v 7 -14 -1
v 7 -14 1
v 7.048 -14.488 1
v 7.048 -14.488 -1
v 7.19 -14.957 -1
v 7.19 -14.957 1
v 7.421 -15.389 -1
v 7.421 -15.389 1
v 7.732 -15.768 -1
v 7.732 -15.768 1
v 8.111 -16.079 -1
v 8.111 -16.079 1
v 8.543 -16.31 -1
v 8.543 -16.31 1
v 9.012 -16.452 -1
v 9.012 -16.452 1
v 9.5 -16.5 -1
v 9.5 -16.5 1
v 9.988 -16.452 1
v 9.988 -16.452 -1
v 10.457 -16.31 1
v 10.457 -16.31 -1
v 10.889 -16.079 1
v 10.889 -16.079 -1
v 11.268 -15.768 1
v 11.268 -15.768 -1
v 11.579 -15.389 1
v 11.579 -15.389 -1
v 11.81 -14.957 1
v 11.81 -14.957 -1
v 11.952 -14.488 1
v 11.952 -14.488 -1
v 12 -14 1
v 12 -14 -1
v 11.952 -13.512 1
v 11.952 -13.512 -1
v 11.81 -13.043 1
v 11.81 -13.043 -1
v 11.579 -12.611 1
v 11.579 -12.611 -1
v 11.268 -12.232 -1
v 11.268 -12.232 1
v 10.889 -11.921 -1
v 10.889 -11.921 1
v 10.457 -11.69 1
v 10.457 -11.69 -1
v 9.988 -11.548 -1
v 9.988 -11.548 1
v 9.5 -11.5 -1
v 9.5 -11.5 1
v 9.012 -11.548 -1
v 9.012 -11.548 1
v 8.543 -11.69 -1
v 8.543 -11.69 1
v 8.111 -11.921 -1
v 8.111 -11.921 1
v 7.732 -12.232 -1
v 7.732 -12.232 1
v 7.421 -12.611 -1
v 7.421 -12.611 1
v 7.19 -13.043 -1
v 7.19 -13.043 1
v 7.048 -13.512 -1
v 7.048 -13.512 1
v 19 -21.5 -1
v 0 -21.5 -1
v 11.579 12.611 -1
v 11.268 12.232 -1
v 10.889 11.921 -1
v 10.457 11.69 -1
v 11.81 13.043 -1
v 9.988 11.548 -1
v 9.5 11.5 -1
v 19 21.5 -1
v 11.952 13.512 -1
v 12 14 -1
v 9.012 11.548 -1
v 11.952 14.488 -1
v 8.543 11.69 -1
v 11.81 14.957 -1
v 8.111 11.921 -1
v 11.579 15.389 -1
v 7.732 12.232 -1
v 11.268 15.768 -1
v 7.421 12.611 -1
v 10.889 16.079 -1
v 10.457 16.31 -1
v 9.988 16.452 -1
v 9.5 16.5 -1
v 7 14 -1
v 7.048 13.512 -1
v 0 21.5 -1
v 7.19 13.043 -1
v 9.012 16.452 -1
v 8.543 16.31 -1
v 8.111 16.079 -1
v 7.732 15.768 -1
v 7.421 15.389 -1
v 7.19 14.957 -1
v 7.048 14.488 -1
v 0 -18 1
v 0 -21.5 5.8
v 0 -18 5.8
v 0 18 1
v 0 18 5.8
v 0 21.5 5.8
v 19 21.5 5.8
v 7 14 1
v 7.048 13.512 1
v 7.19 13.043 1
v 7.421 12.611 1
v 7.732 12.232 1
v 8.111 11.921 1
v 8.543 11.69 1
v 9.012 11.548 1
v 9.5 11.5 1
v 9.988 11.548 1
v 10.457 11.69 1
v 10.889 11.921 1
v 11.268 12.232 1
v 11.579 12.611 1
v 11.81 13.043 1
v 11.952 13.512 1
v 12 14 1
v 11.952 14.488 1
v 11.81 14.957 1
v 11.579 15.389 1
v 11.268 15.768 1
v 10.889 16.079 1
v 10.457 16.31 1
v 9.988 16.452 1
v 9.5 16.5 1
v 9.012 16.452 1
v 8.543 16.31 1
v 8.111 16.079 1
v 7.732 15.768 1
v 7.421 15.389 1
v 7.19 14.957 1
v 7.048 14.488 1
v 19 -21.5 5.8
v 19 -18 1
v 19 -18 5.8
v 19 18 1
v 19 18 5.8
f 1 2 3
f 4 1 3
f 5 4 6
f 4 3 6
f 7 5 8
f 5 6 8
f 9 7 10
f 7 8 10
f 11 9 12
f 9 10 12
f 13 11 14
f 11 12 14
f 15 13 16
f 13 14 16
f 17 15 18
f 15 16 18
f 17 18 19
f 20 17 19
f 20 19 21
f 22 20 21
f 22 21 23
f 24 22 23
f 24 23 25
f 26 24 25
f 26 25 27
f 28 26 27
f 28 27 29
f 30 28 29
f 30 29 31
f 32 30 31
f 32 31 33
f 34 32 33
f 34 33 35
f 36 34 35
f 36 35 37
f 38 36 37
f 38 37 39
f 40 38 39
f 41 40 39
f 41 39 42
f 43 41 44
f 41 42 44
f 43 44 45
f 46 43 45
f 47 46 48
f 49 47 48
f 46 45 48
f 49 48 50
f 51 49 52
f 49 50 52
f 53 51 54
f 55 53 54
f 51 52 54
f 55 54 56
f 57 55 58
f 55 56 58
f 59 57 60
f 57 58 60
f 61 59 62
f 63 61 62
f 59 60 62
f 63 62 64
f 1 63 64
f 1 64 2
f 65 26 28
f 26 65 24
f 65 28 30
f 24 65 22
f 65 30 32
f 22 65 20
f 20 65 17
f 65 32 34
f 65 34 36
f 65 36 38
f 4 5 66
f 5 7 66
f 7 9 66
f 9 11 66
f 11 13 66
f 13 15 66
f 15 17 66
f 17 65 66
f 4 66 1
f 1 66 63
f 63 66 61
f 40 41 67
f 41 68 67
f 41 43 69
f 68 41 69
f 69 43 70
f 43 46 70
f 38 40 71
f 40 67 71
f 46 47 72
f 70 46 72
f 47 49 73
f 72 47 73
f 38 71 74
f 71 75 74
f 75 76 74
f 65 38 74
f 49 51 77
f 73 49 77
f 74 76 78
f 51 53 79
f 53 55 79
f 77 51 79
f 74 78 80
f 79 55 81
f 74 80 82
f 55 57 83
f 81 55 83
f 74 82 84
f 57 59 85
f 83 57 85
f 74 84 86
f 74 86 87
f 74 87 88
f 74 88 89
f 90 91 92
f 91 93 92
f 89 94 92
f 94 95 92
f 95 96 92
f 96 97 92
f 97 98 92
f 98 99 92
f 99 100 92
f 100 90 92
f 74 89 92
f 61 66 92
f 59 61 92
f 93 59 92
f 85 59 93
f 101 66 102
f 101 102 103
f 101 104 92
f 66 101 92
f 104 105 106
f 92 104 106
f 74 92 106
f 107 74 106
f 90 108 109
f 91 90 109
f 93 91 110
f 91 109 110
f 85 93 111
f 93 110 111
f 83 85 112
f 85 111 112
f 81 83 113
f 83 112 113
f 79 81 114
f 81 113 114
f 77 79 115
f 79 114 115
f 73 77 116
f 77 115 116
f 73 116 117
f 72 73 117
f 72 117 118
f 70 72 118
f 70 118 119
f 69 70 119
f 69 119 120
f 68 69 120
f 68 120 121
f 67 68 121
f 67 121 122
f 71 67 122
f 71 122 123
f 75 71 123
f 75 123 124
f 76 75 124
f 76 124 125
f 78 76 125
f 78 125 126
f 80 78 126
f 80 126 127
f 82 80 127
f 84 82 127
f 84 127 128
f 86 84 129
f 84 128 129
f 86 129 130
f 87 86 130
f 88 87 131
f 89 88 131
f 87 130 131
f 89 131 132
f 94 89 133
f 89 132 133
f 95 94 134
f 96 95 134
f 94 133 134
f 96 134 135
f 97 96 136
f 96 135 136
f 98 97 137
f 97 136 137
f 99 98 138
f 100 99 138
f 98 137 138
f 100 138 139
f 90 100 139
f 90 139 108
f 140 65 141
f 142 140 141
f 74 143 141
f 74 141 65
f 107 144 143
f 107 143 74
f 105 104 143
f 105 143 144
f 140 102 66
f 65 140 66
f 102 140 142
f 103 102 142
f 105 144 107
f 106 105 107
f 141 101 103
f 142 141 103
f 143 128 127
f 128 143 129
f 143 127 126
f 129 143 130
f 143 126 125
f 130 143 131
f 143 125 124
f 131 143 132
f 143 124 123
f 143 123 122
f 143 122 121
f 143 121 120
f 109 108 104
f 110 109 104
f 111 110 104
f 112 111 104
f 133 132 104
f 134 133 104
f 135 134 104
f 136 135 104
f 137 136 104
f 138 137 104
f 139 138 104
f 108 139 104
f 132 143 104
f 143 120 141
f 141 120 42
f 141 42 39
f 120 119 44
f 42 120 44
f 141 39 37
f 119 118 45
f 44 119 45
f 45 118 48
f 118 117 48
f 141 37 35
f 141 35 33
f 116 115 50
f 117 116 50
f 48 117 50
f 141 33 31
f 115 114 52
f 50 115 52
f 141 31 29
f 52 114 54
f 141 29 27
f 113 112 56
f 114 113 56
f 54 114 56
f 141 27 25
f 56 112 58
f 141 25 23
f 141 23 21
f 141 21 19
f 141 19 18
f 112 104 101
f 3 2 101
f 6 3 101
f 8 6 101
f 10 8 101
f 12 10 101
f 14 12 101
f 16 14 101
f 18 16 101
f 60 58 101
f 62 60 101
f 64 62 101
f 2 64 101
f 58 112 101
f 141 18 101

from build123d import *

# Parameters (mm, degrees)
F0_W     = 3.5
F0_H     = 4.8
F1_DEPTH = 19
F3_D     = 5
F3_DEPTH = 10
F3_TIP   = 1.5021515476


with BuildPart() as f1:
    # F0 (on Right) → F1 (new body)
    with BuildSketch(Plane.YZ):
        with Locations((-19.75, 3.4)):
            Rectangle(F0_W, F0_H)
        Polygon((21.5, -1), (21.5, 1), (18, 1), (-18, 1), (-21.5, 1), (-21.5, -1), align=None)
        with Locations((19.75, 3.4)):
            Rectangle(F0_W, F0_H)
    extrude(amount=F1_DEPTH)

    # F3
    with Locations(Plane(origin=(0, 0, -1), x_dir=(1, 0, 0), z_dir=(0, 0, -1))):
        with Locations((9.5, 14), (9.5, -14)):
            Hole(F3_D / 2, depth=F3_DEPTH)
            with Locations((0, 0, -(F3_DEPTH + F3_TIP / 2))):  # 118° drill point
                Cone(0, F3_D / 2, F3_TIP, mode=Mode.SUBTRACT)


solid = f1.part
